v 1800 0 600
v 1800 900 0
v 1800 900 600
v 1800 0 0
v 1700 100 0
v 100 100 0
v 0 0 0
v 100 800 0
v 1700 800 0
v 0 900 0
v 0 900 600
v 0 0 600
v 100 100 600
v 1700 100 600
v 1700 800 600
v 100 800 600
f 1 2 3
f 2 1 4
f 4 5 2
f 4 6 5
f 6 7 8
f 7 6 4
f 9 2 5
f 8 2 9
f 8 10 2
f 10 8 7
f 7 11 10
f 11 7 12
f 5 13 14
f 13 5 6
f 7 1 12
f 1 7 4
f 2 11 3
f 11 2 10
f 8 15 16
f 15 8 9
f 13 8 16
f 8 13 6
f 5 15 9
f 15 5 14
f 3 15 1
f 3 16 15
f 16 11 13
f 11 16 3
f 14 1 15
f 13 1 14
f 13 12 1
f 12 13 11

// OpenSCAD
// Generated from plan.json; millimetres. Not a structural design.
// Open in OpenSCAD. Increase explode_mm to inspect courses.
explode_mm = 0;
$fn = 24;
show_fixing_paths = false;

// side-01-C1-S
translate([0, 0, 0+0*explode_mm])
  color([0.70,0.52,0.33]) cube([1800, 100, 200]);
// side-01-C1-N
translate([0, 800, 0+0*explode_mm])
  color([0.70,0.52,0.33]) cube([1800, 100, 200]);
// side-01-C1-W
translate([0, 100, 0+0*explode_mm])
  color([0.70,0.52,0.33]) cube([100, 700, 200]);
// side-01-C1-E
translate([1700, 100, 0+0*explode_mm])
  color([0.70,0.52,0.33]) cube([100, 700, 200]);
// side-01-C2-S
translate([100, 0, 200+1*explode_mm])
  color([0.70,0.52,0.33]) cube([1600, 100, 200]);
// side-01-C2-N
translate([100, 800, 200+1*explode_mm])
  color([0.70,0.52,0.33]) cube([1600, 100, 200]);
// side-01-C2-W
translate([0, 0, 200+1*explode_mm])
  color([0.70,0.52,0.33]) cube([100, 900, 200]);
// side-01-C2-E
translate([1700, 0, 200+1*explode_mm])
  color([0.70,0.52,0.33]) cube([100, 900, 200]);
// side-01-C3-S
translate([0, 0, 400+2*explode_mm])
  color([0.70,0.52,0.33]) cube([1800, 100, 200]);
// side-01-C3-N
translate([0, 800, 400+2*explode_mm])
  color([0.70,0.52,0.33]) cube([1800, 100, 200]);
// side-01-C3-W
translate([0, 100, 400+2*explode_mm])
  color([0.70,0.52,0.33]) cube([100, 700, 200]);
// side-01-C3-E
translate([1700, 100, 400+2*explode_mm])
  color([0.70,0.52,0.33]) cube([100, 700, 200]);
if (show_fixing_paths) translate([50.0, 900, 50.0+0*explode_mm]) rotate([90,0,0]) color([0.8,0.1,0.1]) cylinder(d=7, h=150);
if (show_fixing_paths) translate([50.0, 900, 150.0+0*explode_mm]) rotate([90,0,0]) color([0.8,0.1,0.1]) cylinder(d=7, h=150);
if (show_fixing_paths) translate([1750.0, 900, 50.0+0*explode_mm]) rotate([90,0,0]) color([0.8,0.1,0.1]) cylinder(d=7, h=150);
if (show_fixing_paths) translate([1750.0, 900, 150.0+0*explode_mm]) rotate([90,0,0]) color([0.8,0.1,0.1]) cylinder(d=7, h=150);
if (show_fixing_paths) translate([50.0, 0, 50.0+0*explode_mm]) rotate([-90,0,0]) color([0.8,0.1,0.1]) cylinder(d=7, h=150);
if (show_fixing_paths) translate([50.0, 0, 150.0+0*explode_mm]) rotate([-90,0,0]) color([0.8,0.1,0.1]) cylinder(d=7, h=150);
if (show_fixing_paths) translate([1750.0, 0, 50.0+0*explode_mm]) rotate([-90,0,0]) color([0.8,0.1,0.1]) cylinder(d=7, h=150);
if (show_fixing_paths) translate([1750.0, 0, 150.0+0*explode_mm]) rotate([-90,0,0]) color([0.8,0.1,0.1]) cylinder(d=7, h=150);
if (show_fixing_paths) translate([1800, 50.0, 250.0+1*explode_mm]) rotate([0,-90,0]) color([0.8,0.1,0.1]) cylinder(d=7, h=150);
if (show_fixing_paths) translate([1800, 50.0, 350.0+1*explode_mm]) rotate([0,-90,0]) color([0.8,0.1,0.1]) cylinder(d=7, h=150);
if (show_fixing_paths) translate([1800, 850.0, 250.0+1*explode_mm]) rotate([0,-90,0]) color([0.8,0.1,0.1]) cylinder(d=7, h=150);
if (show_fixing_paths) translate([1800, 850.0, 350.0+1*explode_mm]) rotate([0,-90,0]) color([0.8,0.1,0.1]) cylinder(d=7, h=150);
if (show_fixing_paths) translate([1750.0, 200.0, 400+1*explode_mm]) rotate([180,0,0]) color([0.8,0.1,0.1]) cylinder(d=7, h=250);
if (show_fixing_paths) translate([1750.0, 700.0, 400+1*explode_mm]) rotate([180,0,0]) color([0.8,0.1,0.1]) cylinder(d=7, h=250);
if (show_fixing_paths) translate([300.0, 850.0, 400+1*explode_mm]) rotate([180,0,0]) color([0.8,0.1,0.1]) cylinder(d=7, h=250);
if (show_fixing_paths) translate([900.0, 850.0, 400+1*explode_mm]) rotate([180,0,0]) color([0.8,0.1,0.1]) cylinder(d=7, h=250);
if (show_fixing_paths) translate([1500.0, 850.0, 400+1*explode_mm]) rotate([180,0,0]) color([0.8,0.1,0.1]) cylinder(d=7, h=250);
if (show_fixing_paths) translate([300.0, 50.0, 400+1*explode_mm]) rotate([180,0,0]) color([0.8,0.1,0.1]) cylinder(d=7, h=250);
if (show_fixing_paths) translate([900.0, 50.0, 400+1*explode_mm]) rotate([180,0,0]) color([0.8,0.1,0.1]) cylinder(d=7, h=250);
if (show_fixing_paths) translate([1500.0, 50.0, 400+1*explode_mm]) rotate([180,0,0]) color([0.8,0.1,0.1]) cylinder(d=7, h=250);
if (show_fixing_paths) translate([0, 50.0, 250.0+1*explode_mm]) rotate([0,90,0]) color([0.8,0.1,0.1]) cylinder(d=7, h=150);
if (show_fixing_paths) translate([0, 50.0, 350.0+1*explode_mm]) rotate([0,90,0]) color([0.8,0.1,0.1]) cylinder(d=7, h=150);
if (show_fixing_paths) translate([0, 850.0, 250.0+1*explode_mm]) rotate([0,90,0]) color([0.8,0.1,0.1]) cylinder(d=7, h=150);
if (show_fixing_paths) translate([0, 850.0, 350.0+1*explode_mm]) rotate([0,90,0]) color([0.8,0.1,0.1]) cylinder(d=7, h=150);
if (show_fixing_paths) translate([50.0, 200.0, 400+1*explode_mm]) rotate([180,0,0]) color([0.8,0.1,0.1]) cylinder(d=7, h=250);
if (show_fixing_paths) translate([50.0, 700.0, 400+1*explode_mm]) rotate([180,0,0]) color([0.8,0.1,0.1]) cylinder(d=7, h=250);
if (show_fixing_paths) translate([1750.0, 340.0, 600+2*explode_mm]) rotate([180,0,0]) color([0.8,0.1,0.1]) cylinder(d=7, h=250);
if (show_fixing_paths) translate([1750.0, 640.0, 600+2*explode_mm]) rotate([180,0,0]) color([0.8,0.1,0.1]) cylinder(d=7, h=250);
if (show_fixing_paths) translate([50.0, 900, 450.0+2*explode_mm]) rotate([90,0,0]) color([0.8,0.1,0.1]) cylinder(d=7, h=150);
if (show_fixing_paths) translate([50.0, 900, 550.0+2*explode_mm]) rotate([90,0,0]) color([0.8,0.1,0.1]) cylinder(d=7, h=150);
if (show_fixing_paths) translate([1750.0, 900, 450.0+2*explode_mm]) rotate([90,0,0]) color([0.8,0.1,0.1]) cylinder(d=7, h=150);
if (show_fixing_paths) translate([1750.0, 900, 550.0+2*explode_mm]) rotate([90,0,0]) color([0.8,0.1,0.1]) cylinder(d=7, h=150);
if (show_fixing_paths) translate([240.0, 850.0, 600+2*explode_mm]) rotate([180,0,0]) color([0.8,0.1,0.1]) cylinder(d=7, h=250);
if (show_fixing_paths) translate([706.667, 850.0, 600+2*explode_mm]) rotate([180,0,0]) color([0.8,0.1,0.1]) cylinder(d=7, h=250);
if (show_fixing_paths) translate([1173.333, 850.0, 600+2*explode_mm]) rotate([180,0,0]) color([0.8,0.1,0.1]) cylinder(d=7, h=250);
if (show_fixing_paths) translate([1620.0, 850.0, 600+2*explode_mm]) rotate([180,0,0]) color([0.8,0.1,0.1]) cylinder(d=7, h=250);
if (show_fixing_paths) translate([50.0, 0, 450.0+2*explode_mm]) rotate([-90,0,0]) color([0.8,0.1,0.1]) cylinder(d=7, h=150);
if (show_fixing_paths) translate([50.0, 0, 550.0+2*explode_mm]) rotate([-90,0,0]) color([0.8,0.1,0.1]) cylinder(d=7, h=150);
if (show_fixing_paths) translate([1750.0, 0, 450.0+2*explode_mm]) rotate([-90,0,0]) color([0.8,0.1,0.1]) cylinder(d=7, h=150);
if (show_fixing_paths) translate([1750.0, 0, 550.0+2*explode_mm]) rotate([-90,0,0]) color([0.8,0.1,0.1]) cylinder(d=7, h=150);
if (show_fixing_paths) translate([240.0, 50.0, 600+2*explode_mm]) rotate([180,0,0]) color([0.8,0.1,0.1]) cylinder(d=7, h=250);
if (show_fixing_paths) translate([706.667, 50.0, 600+2*explode_mm]) rotate([180,0,0]) color([0.8,0.1,0.1]) cylinder(d=7, h=250);
if (show_fixing_paths) translate([1173.333, 50.0, 600+2*explode_mm]) rotate([180,0,0]) color([0.8,0.1,0.1]) cylinder(d=7, h=250);
if (show_fixing_paths) translate([1620.0, 50.0, 600+2*explode_mm]) rotate([180,0,0]) color([0.8,0.1,0.1]) cylinder(d=7, h=250);
if (show_fixing_paths) translate([50.0, 340.0, 600+2*explode_mm]) rotate([180,0,0]) color([0.8,0.1,0.1]) cylinder(d=7, h=250);
if (show_fixing_paths) translate([50.0, 640.0, 600+2*explode_mm]) rotate([180,0,0]) color([0.8,0.1,0.1]) cylinder(d=7, h=250);
